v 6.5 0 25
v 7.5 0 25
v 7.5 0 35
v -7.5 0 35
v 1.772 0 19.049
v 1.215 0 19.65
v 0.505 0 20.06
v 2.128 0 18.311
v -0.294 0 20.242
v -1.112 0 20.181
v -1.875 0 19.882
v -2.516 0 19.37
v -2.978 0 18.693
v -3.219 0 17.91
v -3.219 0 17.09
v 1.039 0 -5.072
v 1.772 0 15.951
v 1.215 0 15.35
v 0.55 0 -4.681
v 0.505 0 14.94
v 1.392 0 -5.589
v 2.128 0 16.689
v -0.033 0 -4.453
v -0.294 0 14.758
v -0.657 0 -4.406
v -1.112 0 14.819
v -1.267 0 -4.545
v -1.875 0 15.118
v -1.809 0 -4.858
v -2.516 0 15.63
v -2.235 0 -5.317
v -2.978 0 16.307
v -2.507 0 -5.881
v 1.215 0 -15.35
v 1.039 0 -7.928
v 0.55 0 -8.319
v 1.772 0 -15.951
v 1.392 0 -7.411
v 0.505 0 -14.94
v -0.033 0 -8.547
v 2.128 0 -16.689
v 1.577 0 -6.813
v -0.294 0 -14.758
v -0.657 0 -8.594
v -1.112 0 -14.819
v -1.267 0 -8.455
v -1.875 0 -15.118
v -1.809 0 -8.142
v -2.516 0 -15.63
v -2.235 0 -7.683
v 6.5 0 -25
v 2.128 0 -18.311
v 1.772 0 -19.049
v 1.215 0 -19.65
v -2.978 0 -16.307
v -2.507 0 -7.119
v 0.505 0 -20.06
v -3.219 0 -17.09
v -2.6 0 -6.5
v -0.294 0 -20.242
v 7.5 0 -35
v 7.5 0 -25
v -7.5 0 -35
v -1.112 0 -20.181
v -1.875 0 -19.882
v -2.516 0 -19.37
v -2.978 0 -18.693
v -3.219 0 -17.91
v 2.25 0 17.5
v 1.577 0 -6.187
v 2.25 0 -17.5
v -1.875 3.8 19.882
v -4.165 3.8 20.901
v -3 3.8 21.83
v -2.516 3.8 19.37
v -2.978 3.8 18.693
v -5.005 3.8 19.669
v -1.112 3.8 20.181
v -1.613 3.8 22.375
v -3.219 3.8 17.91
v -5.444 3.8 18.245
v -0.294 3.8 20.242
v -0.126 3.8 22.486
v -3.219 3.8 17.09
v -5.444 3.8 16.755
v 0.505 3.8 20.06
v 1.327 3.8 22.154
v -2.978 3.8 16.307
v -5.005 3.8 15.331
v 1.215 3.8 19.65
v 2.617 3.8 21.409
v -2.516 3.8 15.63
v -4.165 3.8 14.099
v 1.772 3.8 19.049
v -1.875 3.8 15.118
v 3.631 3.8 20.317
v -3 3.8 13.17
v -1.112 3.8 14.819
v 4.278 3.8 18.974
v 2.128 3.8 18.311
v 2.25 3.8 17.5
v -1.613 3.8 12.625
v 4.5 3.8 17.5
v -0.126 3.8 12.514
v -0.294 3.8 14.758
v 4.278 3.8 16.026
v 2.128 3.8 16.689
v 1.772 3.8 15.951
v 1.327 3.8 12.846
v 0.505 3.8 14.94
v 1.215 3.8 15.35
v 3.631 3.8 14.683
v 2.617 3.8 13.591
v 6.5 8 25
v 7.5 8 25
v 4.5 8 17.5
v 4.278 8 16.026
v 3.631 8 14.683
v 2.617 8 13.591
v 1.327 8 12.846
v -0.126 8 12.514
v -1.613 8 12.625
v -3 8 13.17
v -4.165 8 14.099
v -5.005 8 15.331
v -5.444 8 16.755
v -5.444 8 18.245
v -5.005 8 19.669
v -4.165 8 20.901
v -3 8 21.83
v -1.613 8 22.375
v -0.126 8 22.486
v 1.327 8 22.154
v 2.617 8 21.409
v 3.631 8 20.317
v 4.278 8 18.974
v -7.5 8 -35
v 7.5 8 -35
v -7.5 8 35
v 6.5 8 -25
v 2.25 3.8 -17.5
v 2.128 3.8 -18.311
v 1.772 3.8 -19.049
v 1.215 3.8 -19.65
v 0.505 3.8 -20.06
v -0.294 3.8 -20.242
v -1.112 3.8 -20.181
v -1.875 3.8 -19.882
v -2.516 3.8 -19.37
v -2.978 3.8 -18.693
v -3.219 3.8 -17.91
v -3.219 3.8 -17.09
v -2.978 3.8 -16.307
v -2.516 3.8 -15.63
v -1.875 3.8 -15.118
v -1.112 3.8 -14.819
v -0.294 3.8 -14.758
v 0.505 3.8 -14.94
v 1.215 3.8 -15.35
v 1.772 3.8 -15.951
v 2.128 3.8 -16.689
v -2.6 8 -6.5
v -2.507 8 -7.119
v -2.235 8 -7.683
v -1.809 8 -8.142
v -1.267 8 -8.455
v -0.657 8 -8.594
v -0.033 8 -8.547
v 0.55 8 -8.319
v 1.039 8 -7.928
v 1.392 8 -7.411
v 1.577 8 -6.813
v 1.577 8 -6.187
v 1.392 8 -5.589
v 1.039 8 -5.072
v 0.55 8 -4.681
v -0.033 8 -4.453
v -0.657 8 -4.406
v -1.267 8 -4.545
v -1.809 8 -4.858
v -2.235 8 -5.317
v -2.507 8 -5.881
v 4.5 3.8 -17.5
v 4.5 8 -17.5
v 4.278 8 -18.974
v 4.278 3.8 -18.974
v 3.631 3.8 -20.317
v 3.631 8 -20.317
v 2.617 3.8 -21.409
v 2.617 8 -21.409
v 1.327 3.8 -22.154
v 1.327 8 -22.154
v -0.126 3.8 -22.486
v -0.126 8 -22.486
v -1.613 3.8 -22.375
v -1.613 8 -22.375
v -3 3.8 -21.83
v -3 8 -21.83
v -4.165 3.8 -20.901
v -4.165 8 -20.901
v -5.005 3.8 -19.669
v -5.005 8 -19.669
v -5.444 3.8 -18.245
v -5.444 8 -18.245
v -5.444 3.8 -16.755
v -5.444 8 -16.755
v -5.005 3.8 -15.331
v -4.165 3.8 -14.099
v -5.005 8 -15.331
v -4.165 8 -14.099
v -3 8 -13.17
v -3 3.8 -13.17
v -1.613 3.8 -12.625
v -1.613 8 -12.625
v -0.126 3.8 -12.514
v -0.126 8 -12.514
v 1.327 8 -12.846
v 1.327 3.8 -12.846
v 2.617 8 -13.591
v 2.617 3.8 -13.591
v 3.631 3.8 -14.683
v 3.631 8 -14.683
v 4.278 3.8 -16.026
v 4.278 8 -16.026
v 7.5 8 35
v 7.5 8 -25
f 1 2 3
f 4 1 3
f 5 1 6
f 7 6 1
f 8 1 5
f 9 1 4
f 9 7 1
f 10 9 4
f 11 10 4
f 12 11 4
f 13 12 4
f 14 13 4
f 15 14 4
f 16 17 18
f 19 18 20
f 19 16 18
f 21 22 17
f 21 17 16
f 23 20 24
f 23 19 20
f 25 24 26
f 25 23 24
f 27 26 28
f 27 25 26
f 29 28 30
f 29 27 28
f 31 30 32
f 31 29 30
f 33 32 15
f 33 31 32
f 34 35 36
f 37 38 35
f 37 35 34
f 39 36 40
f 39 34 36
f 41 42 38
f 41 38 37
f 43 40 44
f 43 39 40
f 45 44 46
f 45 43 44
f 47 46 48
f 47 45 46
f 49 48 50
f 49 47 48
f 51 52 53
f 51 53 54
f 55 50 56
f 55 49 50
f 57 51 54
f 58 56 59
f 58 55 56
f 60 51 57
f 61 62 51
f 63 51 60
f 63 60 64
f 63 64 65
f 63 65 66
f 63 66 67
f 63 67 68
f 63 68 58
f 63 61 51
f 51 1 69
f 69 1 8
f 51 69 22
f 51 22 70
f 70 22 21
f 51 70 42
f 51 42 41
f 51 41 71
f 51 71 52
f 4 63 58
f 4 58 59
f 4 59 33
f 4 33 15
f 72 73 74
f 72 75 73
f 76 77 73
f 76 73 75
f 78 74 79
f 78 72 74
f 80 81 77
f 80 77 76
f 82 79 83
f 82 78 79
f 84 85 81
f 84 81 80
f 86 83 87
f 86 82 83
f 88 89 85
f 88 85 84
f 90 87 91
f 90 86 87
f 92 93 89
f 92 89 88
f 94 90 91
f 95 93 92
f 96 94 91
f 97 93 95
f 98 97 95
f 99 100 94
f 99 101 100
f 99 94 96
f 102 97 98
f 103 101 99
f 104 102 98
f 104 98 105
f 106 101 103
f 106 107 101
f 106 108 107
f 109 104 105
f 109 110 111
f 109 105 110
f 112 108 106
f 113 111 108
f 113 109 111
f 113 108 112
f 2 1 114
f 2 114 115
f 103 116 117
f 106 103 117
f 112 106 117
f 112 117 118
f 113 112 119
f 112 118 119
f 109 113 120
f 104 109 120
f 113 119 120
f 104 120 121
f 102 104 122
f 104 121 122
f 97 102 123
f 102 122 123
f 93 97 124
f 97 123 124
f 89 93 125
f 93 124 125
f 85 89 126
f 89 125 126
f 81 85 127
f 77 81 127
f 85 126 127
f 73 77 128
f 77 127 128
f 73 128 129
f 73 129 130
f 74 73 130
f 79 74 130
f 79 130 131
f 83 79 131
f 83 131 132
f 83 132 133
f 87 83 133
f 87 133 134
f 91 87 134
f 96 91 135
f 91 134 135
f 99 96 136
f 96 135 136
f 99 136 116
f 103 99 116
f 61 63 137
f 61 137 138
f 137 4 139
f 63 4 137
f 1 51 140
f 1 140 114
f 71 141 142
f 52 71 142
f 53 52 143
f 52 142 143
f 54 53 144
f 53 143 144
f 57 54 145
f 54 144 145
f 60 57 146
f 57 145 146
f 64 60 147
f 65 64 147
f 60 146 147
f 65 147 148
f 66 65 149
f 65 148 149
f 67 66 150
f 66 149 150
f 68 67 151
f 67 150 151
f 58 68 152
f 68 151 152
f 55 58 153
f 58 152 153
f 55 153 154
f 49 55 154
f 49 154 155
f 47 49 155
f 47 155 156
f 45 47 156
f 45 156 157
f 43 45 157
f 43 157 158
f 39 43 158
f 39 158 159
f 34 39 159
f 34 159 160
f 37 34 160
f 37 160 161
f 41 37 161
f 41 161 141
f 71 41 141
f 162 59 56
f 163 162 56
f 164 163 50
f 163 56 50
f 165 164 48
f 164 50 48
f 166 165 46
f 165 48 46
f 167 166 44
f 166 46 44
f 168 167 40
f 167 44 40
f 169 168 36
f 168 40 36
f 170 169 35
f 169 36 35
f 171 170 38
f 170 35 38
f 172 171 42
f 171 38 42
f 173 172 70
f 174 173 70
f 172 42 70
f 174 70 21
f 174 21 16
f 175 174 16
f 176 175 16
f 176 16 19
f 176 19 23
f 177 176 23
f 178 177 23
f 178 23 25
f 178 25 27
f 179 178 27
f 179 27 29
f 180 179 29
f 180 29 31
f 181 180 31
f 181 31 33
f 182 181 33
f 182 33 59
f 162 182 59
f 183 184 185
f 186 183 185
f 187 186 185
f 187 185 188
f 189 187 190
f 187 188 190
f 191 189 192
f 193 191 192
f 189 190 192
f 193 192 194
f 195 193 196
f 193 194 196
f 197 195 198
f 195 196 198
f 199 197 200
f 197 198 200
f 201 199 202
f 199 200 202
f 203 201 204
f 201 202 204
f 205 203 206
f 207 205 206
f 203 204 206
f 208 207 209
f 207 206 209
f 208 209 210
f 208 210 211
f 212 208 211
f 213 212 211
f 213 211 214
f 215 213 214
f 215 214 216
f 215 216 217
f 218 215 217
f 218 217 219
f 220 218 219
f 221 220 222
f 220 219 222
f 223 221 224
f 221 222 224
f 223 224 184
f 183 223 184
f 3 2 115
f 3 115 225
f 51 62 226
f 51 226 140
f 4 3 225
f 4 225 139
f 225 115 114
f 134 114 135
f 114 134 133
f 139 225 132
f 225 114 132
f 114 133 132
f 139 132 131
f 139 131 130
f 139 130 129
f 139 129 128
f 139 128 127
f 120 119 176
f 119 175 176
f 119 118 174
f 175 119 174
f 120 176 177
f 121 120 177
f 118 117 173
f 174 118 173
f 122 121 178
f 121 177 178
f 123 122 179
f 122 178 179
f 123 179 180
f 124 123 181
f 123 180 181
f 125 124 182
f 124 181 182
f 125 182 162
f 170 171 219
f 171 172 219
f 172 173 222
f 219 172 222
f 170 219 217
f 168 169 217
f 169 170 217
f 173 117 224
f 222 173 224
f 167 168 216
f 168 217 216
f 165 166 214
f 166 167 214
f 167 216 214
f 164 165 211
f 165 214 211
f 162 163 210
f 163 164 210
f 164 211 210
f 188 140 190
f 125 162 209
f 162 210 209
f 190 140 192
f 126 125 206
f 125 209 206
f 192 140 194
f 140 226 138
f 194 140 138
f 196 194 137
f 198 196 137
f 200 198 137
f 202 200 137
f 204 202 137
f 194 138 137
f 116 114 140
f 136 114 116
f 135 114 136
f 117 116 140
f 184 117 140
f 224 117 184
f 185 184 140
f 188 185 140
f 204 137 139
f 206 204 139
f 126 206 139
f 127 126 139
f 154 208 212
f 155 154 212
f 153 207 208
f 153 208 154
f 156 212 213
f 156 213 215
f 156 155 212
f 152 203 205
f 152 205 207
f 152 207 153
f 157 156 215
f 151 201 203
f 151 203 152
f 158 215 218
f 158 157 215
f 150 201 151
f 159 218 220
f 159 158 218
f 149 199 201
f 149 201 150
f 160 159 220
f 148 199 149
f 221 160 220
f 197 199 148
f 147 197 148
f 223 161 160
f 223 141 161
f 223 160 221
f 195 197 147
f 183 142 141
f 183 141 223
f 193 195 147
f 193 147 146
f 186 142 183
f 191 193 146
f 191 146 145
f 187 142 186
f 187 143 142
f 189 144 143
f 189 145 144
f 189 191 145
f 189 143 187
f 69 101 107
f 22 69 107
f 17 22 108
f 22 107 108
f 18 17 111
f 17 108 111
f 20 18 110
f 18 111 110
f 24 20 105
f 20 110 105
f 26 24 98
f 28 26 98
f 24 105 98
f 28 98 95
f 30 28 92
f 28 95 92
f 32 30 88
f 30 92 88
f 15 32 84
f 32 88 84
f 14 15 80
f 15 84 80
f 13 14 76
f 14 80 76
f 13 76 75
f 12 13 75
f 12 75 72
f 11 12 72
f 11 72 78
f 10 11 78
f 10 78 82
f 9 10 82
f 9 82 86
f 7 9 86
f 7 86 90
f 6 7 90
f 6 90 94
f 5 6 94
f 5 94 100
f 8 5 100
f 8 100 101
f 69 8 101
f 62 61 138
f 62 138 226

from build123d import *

# Parameters (mm, degrees)
BOSS_EXTRUDE1_DEPTH = 8
SKETCH2_R           = 2.75
CUT_EXTRUDE1_DEPTH  = 9
SKETCH3_R           = 5
CUT_EXTRUDE2_DEPTH  = 4.2
M5_TAPPED_HOLE1_D   = 4.2


with BuildPart() as part:
    # Sketch1 → Boss-Extrude1 (new body)
    with BuildSketch(Plane(origin=(0, 0, 0), x_dir=(1, 0, 0), z_dir=(0, 1, 0))):
        Polygon((7.5, 25), (6.5, 25), (6.5, -25), (7.5, -25), (7.5, -35), (-7.5, -35), (-7.5, 35), (7.5, 35), align=None)
    extrude(amount=BOSS_EXTRUDE1_DEPTH)

    # Sketch2 → Cut-Extrude1 (cut, through all)
    with BuildSketch(Plane(origin=(0, 8, 0), x_dir=(1, 0, 0), z_dir=(0, 1, 0))):
        with Locations((-0.5, 17.5)):
            Circle(SKETCH2_R)
        with Locations((-0.5, -17.5)):
            Circle(SKETCH2_R)
    extrude(amount=-CUT_EXTRUDE1_DEPTH, mode=Mode.SUBTRACT)

    # Sketch3 → Cut-Extrude2 (cut)
    with BuildSketch(Plane(origin=(0, 8, 0), x_dir=(1, 0, 0), z_dir=(0, 1, 0))):
        with Locations((-0.5, 17.5)):
            Circle(SKETCH3_R)
        with Locations((-0.5, -17.5)):
            Circle(SKETCH3_R)
    extrude(amount=-CUT_EXTRUDE2_DEPTH, mode=Mode.SUBTRACT)

    # M5 Tapped Hole1 (through all)
    with Locations(Plane(origin=(0, 8, 0), x_dir=(1, 0, 0), z_dir=(0, 1, 0))):
        with Locations((-0.5, 6.5)):
            Hole(M5_TAPPED_HOLE1_D / 2)


solid = part.part
